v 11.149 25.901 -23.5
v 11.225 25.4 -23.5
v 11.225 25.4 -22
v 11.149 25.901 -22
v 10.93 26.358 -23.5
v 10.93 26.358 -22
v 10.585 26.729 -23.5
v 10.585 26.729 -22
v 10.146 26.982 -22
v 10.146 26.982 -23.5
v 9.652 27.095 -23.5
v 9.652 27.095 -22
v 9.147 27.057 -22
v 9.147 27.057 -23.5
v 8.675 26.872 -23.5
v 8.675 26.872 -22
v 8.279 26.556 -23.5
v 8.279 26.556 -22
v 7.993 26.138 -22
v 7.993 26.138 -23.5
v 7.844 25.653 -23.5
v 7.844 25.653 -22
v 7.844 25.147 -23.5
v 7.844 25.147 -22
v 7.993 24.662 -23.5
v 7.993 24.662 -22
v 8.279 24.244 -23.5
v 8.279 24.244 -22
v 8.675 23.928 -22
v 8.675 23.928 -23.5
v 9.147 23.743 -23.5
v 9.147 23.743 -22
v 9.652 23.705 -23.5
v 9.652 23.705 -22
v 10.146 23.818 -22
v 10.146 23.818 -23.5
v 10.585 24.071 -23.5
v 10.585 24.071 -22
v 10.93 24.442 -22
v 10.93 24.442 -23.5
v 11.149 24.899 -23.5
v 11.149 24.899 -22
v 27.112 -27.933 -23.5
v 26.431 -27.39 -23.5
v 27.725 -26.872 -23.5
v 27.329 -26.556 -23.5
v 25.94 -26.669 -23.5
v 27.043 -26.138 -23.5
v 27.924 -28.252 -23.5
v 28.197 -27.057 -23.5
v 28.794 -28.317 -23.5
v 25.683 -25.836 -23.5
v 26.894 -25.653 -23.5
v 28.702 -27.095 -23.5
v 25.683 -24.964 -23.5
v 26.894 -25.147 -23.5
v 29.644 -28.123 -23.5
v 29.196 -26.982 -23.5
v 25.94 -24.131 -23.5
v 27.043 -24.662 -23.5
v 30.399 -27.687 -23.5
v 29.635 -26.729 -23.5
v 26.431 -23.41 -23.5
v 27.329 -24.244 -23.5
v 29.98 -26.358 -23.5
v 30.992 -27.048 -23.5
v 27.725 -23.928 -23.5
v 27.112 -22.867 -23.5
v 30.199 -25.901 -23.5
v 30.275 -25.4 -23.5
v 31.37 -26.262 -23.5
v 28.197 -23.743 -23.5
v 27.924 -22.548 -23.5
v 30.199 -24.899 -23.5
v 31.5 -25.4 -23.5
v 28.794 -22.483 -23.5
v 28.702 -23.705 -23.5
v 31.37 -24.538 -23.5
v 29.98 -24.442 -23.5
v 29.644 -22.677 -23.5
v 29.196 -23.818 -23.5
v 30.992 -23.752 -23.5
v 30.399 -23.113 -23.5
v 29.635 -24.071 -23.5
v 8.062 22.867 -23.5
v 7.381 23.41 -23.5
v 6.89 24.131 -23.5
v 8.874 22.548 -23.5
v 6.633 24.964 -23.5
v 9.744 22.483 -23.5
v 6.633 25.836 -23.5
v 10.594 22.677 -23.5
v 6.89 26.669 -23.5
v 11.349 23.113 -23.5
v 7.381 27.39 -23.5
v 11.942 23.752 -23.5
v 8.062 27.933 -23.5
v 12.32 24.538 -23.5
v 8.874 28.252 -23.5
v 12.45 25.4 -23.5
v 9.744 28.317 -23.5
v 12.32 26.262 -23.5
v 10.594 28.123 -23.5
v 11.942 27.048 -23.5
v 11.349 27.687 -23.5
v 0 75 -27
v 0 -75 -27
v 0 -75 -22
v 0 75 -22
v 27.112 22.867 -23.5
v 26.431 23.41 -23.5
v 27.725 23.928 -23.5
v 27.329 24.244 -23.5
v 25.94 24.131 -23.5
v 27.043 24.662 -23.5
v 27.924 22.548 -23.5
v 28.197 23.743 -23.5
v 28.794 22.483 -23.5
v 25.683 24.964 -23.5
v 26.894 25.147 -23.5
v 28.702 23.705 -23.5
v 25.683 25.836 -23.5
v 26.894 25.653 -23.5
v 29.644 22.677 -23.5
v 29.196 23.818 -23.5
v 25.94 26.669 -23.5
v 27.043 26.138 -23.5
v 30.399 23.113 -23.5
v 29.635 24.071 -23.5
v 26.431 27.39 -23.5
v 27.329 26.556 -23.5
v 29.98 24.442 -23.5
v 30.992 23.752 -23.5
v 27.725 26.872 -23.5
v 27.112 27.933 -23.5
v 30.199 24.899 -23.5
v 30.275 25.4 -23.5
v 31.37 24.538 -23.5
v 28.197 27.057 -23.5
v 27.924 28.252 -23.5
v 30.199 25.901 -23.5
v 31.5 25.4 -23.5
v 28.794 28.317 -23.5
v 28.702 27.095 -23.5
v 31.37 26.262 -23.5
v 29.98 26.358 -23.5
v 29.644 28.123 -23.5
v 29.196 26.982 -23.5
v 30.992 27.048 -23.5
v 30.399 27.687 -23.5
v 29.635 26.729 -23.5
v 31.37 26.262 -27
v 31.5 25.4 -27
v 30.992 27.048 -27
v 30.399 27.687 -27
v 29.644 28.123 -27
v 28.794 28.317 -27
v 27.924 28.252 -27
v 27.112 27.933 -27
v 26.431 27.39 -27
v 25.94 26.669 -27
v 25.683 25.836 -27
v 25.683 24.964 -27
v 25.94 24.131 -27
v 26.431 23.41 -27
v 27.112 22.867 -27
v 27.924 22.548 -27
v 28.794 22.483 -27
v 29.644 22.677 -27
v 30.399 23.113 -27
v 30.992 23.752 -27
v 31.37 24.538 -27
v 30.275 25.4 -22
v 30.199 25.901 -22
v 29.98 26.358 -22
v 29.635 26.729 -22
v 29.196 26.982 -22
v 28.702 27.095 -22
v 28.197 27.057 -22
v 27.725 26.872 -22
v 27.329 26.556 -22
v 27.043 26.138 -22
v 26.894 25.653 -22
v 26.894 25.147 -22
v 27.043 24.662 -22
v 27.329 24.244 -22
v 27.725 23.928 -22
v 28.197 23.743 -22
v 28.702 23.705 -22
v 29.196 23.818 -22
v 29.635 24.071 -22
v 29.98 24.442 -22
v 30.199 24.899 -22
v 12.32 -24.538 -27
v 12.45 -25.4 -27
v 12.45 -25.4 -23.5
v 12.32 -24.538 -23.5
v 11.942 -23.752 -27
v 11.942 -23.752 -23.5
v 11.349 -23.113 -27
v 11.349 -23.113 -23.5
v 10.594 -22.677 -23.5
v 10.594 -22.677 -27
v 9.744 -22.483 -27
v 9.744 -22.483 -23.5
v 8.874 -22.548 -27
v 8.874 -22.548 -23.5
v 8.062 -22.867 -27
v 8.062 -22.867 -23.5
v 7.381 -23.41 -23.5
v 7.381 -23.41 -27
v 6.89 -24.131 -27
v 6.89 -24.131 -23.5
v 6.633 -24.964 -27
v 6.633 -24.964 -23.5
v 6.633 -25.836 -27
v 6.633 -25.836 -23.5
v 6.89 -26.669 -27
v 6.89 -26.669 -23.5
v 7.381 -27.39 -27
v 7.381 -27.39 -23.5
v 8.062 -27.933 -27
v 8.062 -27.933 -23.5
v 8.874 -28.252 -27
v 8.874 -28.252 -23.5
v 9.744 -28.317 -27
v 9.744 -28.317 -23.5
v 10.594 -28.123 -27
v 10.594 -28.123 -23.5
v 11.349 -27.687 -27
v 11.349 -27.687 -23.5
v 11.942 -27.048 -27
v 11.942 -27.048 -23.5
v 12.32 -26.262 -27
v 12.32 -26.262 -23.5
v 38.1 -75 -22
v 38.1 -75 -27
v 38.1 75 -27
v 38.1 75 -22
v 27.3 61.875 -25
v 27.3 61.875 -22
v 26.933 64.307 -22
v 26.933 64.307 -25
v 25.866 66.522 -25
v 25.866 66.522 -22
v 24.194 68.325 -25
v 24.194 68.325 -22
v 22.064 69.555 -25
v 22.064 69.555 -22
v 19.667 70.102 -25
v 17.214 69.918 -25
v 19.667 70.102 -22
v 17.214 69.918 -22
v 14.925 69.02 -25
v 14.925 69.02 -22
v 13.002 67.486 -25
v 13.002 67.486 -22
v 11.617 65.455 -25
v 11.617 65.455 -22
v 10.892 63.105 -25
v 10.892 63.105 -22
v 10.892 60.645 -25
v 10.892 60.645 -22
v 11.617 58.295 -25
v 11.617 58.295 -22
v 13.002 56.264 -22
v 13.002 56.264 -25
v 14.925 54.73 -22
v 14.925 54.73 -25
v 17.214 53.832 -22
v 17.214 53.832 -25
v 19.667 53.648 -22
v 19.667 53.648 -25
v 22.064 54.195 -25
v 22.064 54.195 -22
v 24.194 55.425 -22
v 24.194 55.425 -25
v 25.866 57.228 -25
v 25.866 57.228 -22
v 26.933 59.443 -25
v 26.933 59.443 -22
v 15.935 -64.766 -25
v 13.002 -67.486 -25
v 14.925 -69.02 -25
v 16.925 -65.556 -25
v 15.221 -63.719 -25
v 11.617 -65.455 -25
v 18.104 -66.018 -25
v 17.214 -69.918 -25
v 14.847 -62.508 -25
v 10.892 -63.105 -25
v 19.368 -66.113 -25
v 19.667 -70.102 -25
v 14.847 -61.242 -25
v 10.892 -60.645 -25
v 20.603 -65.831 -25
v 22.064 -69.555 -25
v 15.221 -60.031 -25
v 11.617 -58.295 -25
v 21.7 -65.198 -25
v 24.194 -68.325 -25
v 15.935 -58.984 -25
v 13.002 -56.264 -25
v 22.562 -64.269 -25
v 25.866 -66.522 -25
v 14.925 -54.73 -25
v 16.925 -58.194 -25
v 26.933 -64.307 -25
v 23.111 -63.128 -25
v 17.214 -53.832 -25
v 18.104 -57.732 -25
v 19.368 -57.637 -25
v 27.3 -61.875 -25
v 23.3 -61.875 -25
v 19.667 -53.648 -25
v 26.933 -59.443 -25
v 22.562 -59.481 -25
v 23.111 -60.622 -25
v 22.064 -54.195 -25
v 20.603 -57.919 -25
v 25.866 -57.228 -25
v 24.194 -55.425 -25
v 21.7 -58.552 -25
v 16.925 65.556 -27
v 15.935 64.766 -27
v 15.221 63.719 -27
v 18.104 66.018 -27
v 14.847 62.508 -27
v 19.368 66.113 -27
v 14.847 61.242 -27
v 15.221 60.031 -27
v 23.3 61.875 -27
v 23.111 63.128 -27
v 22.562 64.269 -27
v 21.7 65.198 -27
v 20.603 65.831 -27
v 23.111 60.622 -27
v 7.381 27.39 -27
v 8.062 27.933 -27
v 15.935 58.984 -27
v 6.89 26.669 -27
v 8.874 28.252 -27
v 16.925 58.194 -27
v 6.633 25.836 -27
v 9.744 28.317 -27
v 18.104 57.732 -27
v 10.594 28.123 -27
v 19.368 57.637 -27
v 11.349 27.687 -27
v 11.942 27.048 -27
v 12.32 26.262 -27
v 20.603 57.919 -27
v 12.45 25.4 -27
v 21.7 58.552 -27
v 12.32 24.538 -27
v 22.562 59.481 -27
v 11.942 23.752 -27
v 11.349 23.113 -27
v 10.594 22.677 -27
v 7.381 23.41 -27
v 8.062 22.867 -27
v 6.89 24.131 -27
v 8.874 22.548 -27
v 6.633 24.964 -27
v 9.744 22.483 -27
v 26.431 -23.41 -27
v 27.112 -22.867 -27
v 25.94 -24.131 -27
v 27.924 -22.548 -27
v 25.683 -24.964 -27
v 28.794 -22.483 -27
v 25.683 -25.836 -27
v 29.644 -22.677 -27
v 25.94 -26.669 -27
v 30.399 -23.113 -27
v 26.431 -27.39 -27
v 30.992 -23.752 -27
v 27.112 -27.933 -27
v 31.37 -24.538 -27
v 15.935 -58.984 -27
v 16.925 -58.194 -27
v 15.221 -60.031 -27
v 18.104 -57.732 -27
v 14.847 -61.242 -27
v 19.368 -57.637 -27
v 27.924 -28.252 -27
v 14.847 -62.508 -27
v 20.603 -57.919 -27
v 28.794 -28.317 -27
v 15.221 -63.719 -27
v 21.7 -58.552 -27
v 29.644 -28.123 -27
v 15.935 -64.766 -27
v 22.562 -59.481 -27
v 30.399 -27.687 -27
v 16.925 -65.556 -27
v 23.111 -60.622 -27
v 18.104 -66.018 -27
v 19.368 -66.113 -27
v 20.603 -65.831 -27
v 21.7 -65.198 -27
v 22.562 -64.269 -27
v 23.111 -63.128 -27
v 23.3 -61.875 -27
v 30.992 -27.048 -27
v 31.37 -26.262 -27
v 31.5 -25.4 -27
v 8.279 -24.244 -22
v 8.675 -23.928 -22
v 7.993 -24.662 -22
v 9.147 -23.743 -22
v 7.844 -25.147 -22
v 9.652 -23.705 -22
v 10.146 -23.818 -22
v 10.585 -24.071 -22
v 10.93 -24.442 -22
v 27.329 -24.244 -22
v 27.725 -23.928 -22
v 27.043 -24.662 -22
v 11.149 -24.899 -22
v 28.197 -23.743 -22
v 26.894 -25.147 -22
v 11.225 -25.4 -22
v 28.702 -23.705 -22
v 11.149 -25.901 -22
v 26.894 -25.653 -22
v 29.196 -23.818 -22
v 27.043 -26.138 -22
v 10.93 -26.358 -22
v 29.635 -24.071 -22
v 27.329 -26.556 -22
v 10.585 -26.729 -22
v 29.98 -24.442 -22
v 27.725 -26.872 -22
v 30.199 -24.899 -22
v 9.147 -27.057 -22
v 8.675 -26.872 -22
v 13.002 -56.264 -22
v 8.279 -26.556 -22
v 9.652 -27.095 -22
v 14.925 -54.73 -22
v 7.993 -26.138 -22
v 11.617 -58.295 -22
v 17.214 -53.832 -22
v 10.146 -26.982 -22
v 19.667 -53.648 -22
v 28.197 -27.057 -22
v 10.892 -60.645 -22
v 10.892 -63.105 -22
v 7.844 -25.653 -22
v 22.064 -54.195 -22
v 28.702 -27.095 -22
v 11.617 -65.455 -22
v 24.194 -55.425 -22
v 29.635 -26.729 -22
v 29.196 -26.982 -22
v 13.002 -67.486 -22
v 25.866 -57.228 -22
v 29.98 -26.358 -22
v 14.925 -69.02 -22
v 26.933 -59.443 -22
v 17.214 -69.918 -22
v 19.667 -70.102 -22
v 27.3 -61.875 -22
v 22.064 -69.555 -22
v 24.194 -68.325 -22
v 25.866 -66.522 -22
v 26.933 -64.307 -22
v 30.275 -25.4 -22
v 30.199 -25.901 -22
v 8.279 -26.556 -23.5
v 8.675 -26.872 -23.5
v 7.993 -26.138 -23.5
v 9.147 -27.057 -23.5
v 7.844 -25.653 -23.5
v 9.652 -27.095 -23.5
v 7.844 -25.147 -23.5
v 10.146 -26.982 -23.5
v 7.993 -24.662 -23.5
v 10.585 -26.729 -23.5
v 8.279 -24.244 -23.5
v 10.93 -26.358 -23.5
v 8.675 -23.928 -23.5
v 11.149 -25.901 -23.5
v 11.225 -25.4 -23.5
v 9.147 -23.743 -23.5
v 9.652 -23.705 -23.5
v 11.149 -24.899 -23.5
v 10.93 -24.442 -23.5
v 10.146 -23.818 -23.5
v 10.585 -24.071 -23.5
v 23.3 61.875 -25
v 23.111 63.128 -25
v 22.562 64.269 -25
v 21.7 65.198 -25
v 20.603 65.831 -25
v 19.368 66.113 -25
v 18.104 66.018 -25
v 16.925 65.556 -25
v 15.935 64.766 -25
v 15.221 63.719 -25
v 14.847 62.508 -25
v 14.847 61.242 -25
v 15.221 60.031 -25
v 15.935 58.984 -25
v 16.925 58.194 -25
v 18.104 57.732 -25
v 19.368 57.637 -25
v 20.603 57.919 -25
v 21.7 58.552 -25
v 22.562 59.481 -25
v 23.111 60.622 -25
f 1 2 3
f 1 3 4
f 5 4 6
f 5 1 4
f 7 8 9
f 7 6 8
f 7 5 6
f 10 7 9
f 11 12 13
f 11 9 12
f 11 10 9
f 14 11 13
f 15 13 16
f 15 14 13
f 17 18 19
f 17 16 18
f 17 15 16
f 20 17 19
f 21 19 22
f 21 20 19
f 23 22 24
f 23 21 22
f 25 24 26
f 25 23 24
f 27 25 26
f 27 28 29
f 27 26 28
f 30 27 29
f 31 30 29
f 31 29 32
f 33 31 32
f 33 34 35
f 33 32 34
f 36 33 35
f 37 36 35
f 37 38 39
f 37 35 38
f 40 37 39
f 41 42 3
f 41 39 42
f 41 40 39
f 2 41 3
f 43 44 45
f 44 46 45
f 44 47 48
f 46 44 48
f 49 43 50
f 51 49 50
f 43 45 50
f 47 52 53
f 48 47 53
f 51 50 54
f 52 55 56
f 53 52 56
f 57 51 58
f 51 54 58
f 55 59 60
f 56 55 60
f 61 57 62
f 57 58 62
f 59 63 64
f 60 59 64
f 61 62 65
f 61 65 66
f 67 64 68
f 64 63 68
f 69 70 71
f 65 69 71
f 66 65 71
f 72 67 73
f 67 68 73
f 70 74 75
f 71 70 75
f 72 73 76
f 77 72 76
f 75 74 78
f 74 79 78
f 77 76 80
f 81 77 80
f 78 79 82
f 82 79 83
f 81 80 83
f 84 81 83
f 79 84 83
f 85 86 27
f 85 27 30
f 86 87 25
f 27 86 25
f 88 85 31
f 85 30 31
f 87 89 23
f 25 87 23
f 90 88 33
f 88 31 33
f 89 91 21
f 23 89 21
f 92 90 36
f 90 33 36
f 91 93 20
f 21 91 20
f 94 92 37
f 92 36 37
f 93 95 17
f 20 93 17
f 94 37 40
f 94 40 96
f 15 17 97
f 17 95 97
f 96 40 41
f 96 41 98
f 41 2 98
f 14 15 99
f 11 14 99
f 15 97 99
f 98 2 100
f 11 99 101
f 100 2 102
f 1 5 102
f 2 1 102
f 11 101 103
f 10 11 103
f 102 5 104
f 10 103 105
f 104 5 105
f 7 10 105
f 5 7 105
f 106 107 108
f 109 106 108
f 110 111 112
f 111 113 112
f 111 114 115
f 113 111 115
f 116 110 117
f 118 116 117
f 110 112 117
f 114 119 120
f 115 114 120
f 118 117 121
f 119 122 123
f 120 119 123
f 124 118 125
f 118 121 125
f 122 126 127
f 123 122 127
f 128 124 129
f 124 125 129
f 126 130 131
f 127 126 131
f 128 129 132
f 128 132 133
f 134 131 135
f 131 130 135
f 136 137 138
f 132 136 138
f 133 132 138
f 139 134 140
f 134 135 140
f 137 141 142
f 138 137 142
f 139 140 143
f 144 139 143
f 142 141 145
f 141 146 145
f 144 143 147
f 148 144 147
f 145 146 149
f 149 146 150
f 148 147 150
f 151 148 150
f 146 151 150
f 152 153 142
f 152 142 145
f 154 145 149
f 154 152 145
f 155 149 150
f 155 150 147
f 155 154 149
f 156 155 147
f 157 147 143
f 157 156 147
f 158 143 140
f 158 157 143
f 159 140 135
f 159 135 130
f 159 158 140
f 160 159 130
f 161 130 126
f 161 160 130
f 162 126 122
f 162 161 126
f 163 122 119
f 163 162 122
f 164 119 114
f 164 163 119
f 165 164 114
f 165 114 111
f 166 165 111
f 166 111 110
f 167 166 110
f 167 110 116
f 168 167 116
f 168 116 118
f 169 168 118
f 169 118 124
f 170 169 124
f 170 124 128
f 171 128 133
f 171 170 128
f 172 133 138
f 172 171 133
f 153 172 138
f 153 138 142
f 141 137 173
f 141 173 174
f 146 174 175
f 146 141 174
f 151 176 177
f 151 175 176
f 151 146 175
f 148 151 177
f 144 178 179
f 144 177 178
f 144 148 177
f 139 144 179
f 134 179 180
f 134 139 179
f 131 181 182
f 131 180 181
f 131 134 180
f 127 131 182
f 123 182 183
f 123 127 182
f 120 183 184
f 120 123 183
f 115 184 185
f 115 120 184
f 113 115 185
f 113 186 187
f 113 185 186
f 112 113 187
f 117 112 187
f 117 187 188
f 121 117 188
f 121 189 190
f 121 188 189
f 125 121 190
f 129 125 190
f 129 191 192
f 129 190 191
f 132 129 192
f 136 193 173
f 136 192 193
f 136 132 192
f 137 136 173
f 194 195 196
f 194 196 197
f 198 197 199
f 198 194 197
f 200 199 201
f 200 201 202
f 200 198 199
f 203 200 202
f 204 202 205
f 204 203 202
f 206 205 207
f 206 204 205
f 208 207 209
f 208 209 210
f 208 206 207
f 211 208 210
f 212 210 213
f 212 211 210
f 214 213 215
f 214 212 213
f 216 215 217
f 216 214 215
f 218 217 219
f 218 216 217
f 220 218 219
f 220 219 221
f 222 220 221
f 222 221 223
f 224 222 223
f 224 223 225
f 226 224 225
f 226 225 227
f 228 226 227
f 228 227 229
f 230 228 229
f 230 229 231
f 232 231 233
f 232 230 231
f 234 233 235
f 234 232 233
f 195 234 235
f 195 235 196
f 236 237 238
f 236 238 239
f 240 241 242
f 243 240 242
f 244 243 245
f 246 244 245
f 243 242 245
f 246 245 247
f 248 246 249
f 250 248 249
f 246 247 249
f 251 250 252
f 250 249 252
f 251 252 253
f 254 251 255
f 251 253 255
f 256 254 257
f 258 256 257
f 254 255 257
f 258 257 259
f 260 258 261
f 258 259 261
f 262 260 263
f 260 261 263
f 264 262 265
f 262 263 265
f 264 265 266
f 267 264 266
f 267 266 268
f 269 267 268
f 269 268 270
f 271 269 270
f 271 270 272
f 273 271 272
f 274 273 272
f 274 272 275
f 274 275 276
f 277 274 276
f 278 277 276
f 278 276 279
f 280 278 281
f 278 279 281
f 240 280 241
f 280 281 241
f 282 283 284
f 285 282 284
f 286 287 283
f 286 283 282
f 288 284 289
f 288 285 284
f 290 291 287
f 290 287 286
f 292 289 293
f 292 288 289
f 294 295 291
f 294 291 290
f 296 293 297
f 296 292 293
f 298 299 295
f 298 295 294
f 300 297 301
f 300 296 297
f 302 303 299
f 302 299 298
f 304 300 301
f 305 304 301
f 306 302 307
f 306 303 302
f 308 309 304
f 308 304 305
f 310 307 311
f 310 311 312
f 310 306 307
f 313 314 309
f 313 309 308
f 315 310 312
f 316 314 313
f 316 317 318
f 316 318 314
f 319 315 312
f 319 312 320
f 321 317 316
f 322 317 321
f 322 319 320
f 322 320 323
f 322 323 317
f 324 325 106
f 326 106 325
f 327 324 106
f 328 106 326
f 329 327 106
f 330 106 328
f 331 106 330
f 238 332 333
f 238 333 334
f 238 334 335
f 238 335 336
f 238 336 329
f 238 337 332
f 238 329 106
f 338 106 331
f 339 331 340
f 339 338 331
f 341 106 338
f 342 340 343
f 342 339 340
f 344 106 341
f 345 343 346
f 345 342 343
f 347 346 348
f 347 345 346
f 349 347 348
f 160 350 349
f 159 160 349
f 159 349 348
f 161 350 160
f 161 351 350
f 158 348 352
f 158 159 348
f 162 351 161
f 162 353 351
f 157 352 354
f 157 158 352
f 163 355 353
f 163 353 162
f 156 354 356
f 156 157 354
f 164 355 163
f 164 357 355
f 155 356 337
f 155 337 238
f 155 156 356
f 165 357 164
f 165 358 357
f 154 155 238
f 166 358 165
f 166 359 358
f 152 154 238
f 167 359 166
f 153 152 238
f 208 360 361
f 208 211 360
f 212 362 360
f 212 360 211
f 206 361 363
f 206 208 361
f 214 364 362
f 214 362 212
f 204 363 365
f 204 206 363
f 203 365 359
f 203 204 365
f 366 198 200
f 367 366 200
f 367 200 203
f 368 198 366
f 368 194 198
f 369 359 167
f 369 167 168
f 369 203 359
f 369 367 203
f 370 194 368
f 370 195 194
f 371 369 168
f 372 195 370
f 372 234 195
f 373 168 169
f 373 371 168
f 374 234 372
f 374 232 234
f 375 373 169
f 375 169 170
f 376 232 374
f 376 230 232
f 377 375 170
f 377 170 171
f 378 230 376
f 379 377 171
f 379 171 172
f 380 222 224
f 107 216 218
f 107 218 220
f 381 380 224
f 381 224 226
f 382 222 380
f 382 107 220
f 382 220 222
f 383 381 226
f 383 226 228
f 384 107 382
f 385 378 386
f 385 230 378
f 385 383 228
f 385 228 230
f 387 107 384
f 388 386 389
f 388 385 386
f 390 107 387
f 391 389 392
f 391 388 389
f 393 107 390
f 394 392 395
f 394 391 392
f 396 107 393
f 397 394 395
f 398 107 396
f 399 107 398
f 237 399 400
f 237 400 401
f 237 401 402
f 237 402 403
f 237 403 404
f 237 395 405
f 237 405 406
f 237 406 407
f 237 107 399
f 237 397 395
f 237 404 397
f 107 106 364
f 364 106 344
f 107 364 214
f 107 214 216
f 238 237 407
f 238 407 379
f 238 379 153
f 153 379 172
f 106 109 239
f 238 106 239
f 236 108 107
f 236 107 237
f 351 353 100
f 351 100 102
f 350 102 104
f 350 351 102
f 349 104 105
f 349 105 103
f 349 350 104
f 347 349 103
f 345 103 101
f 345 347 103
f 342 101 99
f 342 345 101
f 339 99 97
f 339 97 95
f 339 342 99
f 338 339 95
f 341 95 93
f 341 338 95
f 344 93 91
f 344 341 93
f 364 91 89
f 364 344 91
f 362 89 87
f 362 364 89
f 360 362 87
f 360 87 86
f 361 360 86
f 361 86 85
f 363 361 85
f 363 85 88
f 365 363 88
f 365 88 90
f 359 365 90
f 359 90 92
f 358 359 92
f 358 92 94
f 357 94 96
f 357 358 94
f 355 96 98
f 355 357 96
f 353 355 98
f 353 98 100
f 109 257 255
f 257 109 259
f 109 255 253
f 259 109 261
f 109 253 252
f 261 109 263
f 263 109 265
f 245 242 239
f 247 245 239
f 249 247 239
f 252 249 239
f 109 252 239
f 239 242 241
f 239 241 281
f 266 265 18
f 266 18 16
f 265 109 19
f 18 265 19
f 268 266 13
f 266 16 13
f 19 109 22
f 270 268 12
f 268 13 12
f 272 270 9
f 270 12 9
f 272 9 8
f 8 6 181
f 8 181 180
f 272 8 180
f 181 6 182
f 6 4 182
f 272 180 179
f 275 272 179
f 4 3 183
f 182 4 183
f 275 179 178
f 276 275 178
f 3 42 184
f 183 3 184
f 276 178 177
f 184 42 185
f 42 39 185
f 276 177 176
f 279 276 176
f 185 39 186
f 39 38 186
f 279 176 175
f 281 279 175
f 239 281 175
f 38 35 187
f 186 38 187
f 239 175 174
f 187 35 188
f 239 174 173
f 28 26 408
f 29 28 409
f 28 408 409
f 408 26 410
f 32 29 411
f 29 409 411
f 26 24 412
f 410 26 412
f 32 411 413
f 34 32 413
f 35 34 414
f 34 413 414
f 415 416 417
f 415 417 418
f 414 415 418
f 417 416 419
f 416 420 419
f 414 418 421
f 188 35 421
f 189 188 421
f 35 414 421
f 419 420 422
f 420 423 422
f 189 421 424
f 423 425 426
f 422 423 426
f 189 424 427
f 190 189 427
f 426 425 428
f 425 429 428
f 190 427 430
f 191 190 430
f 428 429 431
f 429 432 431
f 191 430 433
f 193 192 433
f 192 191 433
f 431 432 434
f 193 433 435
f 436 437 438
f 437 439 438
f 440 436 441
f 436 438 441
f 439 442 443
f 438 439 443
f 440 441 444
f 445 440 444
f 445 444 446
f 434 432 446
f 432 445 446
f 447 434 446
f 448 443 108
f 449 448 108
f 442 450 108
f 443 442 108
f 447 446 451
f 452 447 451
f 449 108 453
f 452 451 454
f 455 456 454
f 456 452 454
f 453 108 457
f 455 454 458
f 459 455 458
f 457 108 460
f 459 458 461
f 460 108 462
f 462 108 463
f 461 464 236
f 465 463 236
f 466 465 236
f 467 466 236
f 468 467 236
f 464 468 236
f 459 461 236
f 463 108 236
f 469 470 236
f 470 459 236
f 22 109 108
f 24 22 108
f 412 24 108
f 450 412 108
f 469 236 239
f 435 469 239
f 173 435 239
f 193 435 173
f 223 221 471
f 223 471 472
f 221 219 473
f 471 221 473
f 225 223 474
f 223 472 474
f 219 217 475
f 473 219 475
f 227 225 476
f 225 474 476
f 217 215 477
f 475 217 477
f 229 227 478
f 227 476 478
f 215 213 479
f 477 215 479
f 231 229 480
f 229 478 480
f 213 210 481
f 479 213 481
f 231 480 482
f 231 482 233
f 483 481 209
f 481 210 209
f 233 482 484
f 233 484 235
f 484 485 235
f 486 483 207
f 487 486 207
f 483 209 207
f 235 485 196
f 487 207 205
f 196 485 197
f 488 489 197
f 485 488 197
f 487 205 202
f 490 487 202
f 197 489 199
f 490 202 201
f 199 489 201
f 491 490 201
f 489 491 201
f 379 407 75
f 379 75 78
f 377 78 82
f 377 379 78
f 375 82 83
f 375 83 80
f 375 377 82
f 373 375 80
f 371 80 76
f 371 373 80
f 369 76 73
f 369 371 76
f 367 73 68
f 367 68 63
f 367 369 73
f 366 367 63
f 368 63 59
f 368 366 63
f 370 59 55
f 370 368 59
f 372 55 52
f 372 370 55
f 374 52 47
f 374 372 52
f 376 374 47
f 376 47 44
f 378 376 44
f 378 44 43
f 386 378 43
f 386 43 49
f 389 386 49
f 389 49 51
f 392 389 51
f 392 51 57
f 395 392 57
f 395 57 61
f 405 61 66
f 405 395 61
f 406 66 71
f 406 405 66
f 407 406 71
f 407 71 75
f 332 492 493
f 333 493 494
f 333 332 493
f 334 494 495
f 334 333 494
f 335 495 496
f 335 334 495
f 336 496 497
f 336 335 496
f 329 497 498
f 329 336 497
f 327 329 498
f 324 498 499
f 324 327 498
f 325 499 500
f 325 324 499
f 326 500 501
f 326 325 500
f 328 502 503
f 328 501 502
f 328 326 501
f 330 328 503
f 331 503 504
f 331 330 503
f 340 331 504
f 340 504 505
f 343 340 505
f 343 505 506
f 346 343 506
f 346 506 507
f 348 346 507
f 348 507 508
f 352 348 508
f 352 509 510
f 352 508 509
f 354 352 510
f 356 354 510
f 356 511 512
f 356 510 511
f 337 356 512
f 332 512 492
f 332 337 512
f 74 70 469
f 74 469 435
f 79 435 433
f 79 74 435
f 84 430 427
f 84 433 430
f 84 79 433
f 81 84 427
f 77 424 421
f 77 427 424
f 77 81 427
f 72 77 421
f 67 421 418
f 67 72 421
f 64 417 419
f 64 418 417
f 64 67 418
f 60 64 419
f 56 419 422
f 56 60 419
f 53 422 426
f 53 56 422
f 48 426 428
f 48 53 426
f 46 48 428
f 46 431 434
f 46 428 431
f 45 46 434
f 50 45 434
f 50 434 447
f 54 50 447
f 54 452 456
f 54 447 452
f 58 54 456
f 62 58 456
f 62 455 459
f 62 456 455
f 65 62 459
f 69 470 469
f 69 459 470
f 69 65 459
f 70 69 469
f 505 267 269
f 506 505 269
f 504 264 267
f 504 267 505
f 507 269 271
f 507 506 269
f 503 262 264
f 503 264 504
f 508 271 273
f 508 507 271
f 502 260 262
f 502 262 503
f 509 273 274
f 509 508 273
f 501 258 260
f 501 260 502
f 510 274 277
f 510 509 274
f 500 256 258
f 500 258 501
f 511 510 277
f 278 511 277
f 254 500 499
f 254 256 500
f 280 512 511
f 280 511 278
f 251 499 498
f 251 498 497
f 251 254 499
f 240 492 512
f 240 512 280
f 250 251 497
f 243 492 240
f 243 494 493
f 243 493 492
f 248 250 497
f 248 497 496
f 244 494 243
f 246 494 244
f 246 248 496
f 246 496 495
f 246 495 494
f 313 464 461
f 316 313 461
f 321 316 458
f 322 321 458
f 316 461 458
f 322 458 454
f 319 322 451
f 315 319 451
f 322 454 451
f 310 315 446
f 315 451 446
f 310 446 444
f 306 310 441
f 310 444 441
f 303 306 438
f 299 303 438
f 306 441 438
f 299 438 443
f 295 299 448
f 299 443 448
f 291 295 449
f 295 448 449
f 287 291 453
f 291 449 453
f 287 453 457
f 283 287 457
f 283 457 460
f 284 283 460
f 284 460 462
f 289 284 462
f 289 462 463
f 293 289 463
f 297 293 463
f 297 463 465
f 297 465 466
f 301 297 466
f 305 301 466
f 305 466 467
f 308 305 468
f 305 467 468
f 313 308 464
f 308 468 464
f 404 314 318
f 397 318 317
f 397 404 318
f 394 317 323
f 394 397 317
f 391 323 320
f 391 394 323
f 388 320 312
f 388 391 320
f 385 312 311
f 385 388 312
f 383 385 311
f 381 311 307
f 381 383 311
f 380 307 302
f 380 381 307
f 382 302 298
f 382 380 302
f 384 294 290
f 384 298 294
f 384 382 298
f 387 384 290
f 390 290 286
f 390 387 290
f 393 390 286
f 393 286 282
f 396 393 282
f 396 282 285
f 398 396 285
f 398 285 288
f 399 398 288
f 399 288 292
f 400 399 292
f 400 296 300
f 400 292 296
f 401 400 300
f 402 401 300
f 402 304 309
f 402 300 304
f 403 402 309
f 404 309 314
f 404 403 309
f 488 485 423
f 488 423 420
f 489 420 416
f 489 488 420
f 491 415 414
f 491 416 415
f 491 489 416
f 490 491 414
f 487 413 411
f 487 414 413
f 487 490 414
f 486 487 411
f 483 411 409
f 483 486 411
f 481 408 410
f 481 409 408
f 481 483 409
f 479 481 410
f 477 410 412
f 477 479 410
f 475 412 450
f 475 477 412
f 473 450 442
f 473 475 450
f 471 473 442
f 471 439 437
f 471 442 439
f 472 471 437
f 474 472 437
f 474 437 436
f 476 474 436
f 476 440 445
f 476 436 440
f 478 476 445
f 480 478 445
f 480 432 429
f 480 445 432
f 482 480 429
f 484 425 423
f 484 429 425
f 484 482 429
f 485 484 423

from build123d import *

# Parameters (mm, degrees)
SKETCH015_W     = 38.1
SKETCH015_H     = 5
PAD002_DEPTH    = 150
SKETCH016_R     = 4.25
POCKET004_DEPTH = 5.001
SKETCH017_R     = 8.25
POCKET005_DEPTH = 3
SKETCH018_R     = 1.7
POCKET006_DEPTH = 5.001
SKETCH019_R     = 2.925
POCKET007_DEPTH = 3.5


with BuildPart() as part:
    # Sketch015 → Pad002 (new body)
    with BuildSketch(Plane.XZ.offset(75)):
        with Locations((19.05, 2.5)):
            Rectangle(SKETCH015_W, SKETCH015_H)
    extrude(amount=-PAD002_DEPTH)

    # Sketch016 → Pocket004 (cut, through all)
    with BuildSketch(Plane.XY):
        with Locations((19.05, 61.875)):
            Circle(SKETCH016_R)
        with Locations((19.05, -61.875)):
            Circle(SKETCH016_R)
    extrude(amount=POCKET004_DEPTH, mode=Mode.SUBTRACT)

    # Sketch017 → Pocket005 (cut)
    with BuildSketch(Plane.XY.offset(5)):
        with Locations((19.05, 61.875)):
            Circle(SKETCH017_R)
        with Locations((19.05, -61.875)):
            Circle(SKETCH017_R)
    extrude(amount=-POCKET005_DEPTH, mode=Mode.SUBTRACT)

    # Sketch018 → Pocket006 (cut, through all)
    with BuildSketch(Plane.XY):
        with Locations((9.525, 25.4)):
            Circle(SKETCH018_R)
        with Locations((28.575, 25.4)):
            Circle(SKETCH018_R)
        with Locations((9.525, -25.4)):
            Circle(SKETCH018_R)
        with Locations((28.575, -25.4)):
            Circle(SKETCH018_R)
    extrude(amount=POCKET006_DEPTH, mode=Mode.SUBTRACT)

    # Sketch019 → Pocket007 (cut)
    with BuildSketch(Plane.XY):
        with Locations((9.525, 25.4)):
            Circle(SKETCH019_R)
        with Locations((28.575, 25.4)):
            Circle(SKETCH019_R)
        with Locations((9.525, -25.4)):
            Circle(SKETCH019_R)
        with Locations((28.575, -25.4)):
            Circle(SKETCH019_R)
    extrude(amount=POCKET007_DEPTH, mode=Mode.SUBTRACT)


with BuildPart() as part_1:
    # Body001 placement: moved
    add(part.part.moved(Location((0, 0, -27))))


solid = part_1.part
